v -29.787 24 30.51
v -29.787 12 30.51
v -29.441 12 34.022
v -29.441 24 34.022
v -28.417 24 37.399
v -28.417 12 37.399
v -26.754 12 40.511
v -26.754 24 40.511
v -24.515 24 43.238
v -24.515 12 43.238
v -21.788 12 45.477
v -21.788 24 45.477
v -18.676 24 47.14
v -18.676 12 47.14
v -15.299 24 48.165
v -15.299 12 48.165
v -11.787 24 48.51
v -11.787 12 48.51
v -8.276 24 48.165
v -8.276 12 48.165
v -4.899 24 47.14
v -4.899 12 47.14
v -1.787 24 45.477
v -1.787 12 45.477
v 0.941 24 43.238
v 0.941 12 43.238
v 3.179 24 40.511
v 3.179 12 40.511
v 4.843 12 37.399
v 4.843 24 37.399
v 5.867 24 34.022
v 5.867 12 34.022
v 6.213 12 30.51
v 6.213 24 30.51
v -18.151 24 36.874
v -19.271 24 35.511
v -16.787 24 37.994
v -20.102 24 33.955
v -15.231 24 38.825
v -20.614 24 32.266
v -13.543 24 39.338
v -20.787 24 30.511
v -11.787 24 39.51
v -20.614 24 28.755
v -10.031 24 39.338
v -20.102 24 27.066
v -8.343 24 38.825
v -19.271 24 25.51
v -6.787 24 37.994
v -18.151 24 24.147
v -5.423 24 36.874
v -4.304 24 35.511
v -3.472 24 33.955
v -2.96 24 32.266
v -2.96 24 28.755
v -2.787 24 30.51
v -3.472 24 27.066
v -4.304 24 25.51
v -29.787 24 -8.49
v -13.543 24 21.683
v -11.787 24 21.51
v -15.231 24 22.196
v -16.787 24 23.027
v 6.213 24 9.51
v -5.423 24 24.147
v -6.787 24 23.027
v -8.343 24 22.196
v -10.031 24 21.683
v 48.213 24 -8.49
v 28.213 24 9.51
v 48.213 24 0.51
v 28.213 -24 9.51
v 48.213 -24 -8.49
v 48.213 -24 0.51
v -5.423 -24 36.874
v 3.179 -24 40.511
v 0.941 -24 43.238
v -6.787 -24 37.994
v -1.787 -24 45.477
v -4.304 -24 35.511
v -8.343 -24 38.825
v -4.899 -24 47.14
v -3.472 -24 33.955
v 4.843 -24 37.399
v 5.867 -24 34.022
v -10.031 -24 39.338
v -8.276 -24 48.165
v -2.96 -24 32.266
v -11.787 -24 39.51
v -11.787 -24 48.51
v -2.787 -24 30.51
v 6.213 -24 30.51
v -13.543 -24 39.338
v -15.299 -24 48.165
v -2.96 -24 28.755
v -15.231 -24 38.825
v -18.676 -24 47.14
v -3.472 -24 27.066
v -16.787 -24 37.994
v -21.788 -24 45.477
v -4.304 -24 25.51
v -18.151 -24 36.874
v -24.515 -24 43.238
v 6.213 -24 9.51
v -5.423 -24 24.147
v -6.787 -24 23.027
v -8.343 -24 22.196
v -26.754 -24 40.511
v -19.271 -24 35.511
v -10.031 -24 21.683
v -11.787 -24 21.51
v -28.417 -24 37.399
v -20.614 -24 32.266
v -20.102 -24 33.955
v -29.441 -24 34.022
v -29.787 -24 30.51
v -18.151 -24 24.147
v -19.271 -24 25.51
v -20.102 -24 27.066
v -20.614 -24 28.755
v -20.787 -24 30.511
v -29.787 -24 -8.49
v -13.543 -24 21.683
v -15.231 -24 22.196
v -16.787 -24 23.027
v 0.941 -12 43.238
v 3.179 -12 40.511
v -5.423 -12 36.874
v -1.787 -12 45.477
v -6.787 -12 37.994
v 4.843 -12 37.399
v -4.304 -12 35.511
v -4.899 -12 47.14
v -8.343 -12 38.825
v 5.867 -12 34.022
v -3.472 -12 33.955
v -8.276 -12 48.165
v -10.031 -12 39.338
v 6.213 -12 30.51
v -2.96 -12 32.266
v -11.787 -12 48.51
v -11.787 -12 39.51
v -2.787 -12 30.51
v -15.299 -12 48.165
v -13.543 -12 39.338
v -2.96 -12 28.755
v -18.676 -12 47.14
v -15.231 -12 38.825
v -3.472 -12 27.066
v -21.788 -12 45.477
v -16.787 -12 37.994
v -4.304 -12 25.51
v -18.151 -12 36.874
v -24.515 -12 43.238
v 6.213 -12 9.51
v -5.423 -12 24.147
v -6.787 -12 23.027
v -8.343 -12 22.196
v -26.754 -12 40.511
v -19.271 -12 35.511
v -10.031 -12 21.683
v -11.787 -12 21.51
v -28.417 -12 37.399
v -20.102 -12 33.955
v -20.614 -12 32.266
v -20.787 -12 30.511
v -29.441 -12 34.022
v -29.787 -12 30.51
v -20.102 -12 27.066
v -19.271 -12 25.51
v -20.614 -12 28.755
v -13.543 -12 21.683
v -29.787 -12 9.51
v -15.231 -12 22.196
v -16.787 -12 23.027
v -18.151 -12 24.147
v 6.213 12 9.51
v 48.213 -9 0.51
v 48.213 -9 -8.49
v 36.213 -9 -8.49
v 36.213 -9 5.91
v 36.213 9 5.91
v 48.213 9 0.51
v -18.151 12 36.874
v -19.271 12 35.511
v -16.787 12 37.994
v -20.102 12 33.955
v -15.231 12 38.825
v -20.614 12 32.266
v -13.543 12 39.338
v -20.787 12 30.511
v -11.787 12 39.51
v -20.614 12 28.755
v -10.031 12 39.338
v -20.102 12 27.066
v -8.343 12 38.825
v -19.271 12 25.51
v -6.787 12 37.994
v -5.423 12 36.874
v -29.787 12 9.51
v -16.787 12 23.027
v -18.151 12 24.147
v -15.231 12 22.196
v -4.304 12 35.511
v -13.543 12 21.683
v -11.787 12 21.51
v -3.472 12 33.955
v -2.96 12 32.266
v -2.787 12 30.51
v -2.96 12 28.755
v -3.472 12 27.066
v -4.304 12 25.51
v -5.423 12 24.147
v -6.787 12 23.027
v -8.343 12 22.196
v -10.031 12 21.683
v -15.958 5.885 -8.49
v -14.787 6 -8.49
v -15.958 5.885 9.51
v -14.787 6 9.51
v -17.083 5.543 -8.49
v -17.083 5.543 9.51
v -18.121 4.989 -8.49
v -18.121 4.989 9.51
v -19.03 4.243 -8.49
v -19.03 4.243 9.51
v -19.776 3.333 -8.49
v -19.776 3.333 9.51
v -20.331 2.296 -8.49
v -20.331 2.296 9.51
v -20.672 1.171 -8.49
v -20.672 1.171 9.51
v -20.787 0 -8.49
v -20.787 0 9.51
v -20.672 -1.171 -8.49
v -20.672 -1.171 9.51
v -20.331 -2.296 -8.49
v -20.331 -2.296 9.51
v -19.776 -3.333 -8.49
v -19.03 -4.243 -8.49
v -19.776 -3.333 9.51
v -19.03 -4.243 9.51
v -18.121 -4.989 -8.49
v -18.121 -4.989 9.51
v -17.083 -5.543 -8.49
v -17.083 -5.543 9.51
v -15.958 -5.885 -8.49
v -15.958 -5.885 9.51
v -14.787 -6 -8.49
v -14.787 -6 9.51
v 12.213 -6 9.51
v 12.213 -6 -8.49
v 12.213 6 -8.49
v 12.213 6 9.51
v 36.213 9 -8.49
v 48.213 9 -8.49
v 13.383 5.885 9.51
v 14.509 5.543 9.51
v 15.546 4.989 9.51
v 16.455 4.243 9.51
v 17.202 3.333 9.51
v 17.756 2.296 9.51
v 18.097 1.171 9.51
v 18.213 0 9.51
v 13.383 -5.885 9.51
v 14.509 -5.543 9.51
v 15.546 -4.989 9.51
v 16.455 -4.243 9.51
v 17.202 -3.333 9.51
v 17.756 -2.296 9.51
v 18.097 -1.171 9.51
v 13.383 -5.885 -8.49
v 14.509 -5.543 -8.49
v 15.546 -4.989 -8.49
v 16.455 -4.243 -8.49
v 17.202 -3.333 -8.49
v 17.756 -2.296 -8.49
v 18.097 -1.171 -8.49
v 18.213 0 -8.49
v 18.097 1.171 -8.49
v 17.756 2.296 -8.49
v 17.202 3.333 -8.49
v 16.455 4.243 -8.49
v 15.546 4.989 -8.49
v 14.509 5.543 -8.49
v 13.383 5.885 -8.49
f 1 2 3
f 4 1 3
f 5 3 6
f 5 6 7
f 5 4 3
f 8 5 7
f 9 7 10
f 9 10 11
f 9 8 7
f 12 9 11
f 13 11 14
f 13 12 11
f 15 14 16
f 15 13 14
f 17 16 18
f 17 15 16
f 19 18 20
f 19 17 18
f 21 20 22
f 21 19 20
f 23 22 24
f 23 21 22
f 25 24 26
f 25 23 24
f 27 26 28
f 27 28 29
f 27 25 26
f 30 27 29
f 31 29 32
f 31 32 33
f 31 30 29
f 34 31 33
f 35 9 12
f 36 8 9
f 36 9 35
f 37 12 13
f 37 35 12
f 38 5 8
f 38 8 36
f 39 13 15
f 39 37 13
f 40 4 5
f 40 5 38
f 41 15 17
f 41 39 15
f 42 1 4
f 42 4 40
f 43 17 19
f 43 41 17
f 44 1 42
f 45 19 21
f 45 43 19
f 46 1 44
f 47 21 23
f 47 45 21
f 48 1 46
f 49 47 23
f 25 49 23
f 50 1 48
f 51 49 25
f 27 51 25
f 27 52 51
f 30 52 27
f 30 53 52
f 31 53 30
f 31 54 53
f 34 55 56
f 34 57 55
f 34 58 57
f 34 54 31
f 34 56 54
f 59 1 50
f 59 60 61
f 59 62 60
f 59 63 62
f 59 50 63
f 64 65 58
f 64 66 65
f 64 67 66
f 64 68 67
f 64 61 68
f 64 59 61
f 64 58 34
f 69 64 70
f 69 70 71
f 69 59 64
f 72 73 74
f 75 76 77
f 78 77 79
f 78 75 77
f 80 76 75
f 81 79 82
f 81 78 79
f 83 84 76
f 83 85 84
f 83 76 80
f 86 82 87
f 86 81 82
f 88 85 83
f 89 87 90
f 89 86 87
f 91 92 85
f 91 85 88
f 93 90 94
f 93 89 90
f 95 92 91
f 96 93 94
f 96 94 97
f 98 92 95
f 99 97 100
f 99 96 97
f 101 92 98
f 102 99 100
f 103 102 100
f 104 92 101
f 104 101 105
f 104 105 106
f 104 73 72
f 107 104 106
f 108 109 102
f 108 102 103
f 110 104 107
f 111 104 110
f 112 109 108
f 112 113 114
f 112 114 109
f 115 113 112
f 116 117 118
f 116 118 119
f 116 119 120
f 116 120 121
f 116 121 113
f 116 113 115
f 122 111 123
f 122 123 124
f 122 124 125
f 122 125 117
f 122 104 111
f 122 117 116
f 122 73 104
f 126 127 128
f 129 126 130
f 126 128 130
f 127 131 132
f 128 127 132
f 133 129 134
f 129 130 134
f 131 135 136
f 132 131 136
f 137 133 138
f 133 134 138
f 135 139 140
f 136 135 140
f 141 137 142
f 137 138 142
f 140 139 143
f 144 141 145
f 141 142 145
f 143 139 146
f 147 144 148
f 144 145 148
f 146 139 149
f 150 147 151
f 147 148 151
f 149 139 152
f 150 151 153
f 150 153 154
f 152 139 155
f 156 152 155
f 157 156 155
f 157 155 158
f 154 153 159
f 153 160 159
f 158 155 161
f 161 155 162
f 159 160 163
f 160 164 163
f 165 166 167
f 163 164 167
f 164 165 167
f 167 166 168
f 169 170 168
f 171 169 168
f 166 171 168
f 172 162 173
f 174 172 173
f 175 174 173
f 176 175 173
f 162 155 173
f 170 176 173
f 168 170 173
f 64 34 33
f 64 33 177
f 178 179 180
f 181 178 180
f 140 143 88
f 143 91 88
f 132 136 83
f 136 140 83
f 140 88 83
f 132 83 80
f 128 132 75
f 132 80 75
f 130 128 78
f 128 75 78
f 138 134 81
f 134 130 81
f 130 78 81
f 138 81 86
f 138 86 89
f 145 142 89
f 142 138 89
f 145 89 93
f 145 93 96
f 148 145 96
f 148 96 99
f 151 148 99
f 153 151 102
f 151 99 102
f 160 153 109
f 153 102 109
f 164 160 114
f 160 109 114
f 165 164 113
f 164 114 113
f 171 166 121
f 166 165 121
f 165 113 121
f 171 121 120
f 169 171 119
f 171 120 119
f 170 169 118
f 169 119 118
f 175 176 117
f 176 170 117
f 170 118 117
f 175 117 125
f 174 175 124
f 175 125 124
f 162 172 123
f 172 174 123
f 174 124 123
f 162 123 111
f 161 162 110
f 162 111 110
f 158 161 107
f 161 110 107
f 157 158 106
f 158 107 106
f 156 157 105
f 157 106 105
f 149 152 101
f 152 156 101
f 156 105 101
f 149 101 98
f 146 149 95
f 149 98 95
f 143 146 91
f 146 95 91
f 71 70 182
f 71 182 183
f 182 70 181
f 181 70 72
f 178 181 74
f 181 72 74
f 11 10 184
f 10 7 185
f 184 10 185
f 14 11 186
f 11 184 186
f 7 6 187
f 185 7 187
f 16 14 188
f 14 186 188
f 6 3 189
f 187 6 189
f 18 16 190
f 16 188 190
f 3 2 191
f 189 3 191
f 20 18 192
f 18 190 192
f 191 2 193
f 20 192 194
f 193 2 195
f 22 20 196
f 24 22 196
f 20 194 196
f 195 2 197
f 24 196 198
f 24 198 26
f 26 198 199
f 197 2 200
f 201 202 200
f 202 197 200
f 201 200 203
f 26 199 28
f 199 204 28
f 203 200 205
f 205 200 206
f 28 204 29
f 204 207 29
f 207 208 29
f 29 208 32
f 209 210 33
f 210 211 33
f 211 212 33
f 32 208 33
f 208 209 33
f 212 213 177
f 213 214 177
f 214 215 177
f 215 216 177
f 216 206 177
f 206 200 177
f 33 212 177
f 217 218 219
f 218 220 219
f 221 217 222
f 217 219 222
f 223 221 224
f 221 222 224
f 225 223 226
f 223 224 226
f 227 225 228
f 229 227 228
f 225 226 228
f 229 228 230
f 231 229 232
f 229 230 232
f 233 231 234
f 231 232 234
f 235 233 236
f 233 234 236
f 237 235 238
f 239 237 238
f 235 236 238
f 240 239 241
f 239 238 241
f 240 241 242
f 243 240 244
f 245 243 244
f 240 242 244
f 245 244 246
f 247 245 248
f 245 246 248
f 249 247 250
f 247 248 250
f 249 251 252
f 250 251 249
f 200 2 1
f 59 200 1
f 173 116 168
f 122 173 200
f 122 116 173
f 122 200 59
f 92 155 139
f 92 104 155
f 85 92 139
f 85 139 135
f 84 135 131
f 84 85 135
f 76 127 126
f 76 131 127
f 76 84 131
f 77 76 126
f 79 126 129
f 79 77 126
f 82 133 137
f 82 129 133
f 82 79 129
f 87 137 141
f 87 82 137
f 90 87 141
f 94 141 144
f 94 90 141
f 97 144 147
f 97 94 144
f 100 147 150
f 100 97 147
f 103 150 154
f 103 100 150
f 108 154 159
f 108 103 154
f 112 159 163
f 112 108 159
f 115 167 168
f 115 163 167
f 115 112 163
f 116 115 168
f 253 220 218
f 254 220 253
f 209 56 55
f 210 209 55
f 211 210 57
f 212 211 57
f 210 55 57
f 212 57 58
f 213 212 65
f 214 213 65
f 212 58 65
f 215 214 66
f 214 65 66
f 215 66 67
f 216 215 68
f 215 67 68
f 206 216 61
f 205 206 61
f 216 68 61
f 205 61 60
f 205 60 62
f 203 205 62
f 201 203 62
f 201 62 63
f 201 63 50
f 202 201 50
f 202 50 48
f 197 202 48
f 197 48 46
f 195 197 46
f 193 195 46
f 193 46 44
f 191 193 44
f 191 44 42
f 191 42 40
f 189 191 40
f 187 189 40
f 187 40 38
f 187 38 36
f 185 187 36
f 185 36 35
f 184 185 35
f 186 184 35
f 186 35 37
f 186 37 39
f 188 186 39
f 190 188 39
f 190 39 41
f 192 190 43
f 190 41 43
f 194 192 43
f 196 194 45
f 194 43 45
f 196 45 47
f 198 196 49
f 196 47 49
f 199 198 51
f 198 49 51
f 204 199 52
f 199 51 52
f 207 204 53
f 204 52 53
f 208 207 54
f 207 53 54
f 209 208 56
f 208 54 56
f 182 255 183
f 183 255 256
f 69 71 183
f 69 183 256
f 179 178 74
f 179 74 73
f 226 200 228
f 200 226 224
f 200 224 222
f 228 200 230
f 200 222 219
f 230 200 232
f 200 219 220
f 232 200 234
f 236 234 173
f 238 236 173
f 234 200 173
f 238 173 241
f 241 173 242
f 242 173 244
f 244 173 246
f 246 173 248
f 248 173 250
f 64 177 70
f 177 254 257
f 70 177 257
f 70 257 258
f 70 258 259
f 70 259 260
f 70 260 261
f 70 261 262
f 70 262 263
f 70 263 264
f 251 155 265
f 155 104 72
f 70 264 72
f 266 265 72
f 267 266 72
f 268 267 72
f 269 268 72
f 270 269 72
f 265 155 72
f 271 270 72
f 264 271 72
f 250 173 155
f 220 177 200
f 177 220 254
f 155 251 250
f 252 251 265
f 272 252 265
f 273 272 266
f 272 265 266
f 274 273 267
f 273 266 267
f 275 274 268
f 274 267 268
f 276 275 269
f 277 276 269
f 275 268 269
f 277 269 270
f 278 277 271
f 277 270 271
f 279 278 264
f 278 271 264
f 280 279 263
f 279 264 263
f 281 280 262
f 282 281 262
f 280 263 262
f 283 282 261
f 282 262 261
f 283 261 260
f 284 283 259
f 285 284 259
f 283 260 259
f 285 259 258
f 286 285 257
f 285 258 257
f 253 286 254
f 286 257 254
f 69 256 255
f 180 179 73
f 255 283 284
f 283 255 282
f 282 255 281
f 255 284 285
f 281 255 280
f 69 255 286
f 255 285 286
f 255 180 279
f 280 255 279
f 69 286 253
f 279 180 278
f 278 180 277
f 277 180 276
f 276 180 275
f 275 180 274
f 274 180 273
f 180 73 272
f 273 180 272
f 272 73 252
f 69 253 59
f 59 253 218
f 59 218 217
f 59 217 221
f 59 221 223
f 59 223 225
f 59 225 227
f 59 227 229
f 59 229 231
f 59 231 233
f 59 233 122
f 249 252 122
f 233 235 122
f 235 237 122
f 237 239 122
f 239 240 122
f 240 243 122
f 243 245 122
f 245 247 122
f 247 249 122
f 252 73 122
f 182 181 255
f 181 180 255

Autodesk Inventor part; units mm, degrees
ref_plane "YZ Plane" through (0, 0, 0) normal (1, 0, 0) x (0, 1, 0)
ref_plane "XZ Plane" through (0, 0, 0) normal (0, 1, 0) x (-1, 0, 0)
ref_plane "XY Plane" through (0, 0, 0) normal (0, 0, 1) x (1, 0, 0)
sketch "草图2" plane through (0, 0, 0) normal (0, 1, 0) x (-1, 0, 0)
  line L0 (29.7873, 9.5105) -> (-28.2127, 9.5105)
  line L1 (-28.2127, 9.5105) -> (-48.2127, 0.5105)
  line L2 (-48.2127, 0.5105) -> (-48.2127, -8.4895)
  line L3 (-48.2127, -8.4895) -> (29.7873, -8.4895)
  line L4 (29.7873, -8.4895) -> (29.7873, 9.5105)
  dimension "d3" = 9
  dimension "d4" = 78
  dimension "d5" = 18
  dimension "d6" = 58
extrude "拉伸1" add sketch "草图2" along normal mid plane 48
sketch "草图3" plane through (48.2127, 24, -8.4895) normal (0, 0, -1) x (-1, 0, 0)
  line L0 (78, -48) -> (78, 0) projected
  line L1 (0, 0) -> (78, 0) projected
  line L2 (0, -48) -> (0, 0) projected
  line L3 (78, -48) -> (0, -48) projected
  line L4 (0, -48) -> (0, 0) projected
  line L5 (0, -33) -> (12, -33)
  line L6 (12, -33) -> (12, -15)
  line L7 (12, -15) -> (0, -15)
  line L8 (0, -15) -> (0, -33)
  point P0 (48.2127, -24)
  point P1 (0, -24)
  point P2 (0, -24)
  point P3 (0, -24)
  dimension "d9" = 18
  dimension "d10" = 12
extrude "拉伸2" cut sketch "草图3" against normal up to surface contours L2 L7 L6 L5 surface through (28.2127, 0, 9.5105) normal (0.4103647, 0, 0.9119215)
sketch "草图4" plane through (0, 24, 0) normal (0, 1, 0) x (1, 0, 0)
  line L0 (28.2127, -9.5105) -> (48.2127, -0.5105) projected
  line L1 (48.2127, -0.5105) -> (48.2127, 8.4895) projected
  line L2 (48.2127, 8.4895) -> (-29.7873, 8.4895) projected
  line L3 (-29.7873, 8.4895) -> (-29.7873, -9.5105) projected
  line L4 (-29.7873, -9.5105) -> (28.2127, -9.5105) projected
  line L5 (28.2127, -9.5105) -> (-29.7873, -9.5105) projected
  line L6 (-29.7873, -9.5105) -> (-29.7873, -30.5105)
  arc A0 (-29.7873, -30.5105) -> (6.2127, -30.5105) centre (-11.7873, -30.5105) ccw
  line L7 (6.2127, -30.5105) -> (6.2127, -9.5105)
  circle A1 centre (-11.7873, -30.5105) radius 9
  point P0 (0, 0)
  dimension "d13" = 39
  dimension "d14" = 18
  dimension "d15" = 18
extrude "拉伸3" add sketch "草图4" against normal blind 12 contours L7 A0 L6 L4
mirror "镜像1" about plane through (0, 0, 0) normal (0, 1, 0) of "拉伸3"
sketch "草图5" plane through (28.2127, -24, 9.5105) normal (0, 0, 1) x (1, 0, 0)
  line L0 (-58, 12) -> (-22, 12) projected
  line L1 (-22, 12) -> (-22, 0) projected
  line L2 (0, 0) -> (-22, 0) projected
  line L3 (0, 48) -> (0, 0) projected
  line L4 (-22, 48) -> (0, 48) projected
  line L5 (-22, 48) -> (-22, 36) projected
  line L6 (-22, 36) -> (-58, 36) projected
  line L7 (-58, 12) -> (-58, 36) projected
  line L8 (-16, 18) -> (-43, 18)
  arc A0 (-43, 30) -> (-43, 18) centre (-43, 24) ccw
  line L9 (-43, 30) -> (-16, 30)
  arc A1 (-16, 18) -> (-16, 30) centre (-16, 24) ccw
  point P0 (-28.2127, 24)
  point P1 (-58, 24)
  dimension "d18" = 6
  dimension "d19" = 27
  dimension "d20" = 15
extrude "拉伸4" cut sketch "草图5" against normal up to surface (18 mm away) contours L8 A0 L9 A1
